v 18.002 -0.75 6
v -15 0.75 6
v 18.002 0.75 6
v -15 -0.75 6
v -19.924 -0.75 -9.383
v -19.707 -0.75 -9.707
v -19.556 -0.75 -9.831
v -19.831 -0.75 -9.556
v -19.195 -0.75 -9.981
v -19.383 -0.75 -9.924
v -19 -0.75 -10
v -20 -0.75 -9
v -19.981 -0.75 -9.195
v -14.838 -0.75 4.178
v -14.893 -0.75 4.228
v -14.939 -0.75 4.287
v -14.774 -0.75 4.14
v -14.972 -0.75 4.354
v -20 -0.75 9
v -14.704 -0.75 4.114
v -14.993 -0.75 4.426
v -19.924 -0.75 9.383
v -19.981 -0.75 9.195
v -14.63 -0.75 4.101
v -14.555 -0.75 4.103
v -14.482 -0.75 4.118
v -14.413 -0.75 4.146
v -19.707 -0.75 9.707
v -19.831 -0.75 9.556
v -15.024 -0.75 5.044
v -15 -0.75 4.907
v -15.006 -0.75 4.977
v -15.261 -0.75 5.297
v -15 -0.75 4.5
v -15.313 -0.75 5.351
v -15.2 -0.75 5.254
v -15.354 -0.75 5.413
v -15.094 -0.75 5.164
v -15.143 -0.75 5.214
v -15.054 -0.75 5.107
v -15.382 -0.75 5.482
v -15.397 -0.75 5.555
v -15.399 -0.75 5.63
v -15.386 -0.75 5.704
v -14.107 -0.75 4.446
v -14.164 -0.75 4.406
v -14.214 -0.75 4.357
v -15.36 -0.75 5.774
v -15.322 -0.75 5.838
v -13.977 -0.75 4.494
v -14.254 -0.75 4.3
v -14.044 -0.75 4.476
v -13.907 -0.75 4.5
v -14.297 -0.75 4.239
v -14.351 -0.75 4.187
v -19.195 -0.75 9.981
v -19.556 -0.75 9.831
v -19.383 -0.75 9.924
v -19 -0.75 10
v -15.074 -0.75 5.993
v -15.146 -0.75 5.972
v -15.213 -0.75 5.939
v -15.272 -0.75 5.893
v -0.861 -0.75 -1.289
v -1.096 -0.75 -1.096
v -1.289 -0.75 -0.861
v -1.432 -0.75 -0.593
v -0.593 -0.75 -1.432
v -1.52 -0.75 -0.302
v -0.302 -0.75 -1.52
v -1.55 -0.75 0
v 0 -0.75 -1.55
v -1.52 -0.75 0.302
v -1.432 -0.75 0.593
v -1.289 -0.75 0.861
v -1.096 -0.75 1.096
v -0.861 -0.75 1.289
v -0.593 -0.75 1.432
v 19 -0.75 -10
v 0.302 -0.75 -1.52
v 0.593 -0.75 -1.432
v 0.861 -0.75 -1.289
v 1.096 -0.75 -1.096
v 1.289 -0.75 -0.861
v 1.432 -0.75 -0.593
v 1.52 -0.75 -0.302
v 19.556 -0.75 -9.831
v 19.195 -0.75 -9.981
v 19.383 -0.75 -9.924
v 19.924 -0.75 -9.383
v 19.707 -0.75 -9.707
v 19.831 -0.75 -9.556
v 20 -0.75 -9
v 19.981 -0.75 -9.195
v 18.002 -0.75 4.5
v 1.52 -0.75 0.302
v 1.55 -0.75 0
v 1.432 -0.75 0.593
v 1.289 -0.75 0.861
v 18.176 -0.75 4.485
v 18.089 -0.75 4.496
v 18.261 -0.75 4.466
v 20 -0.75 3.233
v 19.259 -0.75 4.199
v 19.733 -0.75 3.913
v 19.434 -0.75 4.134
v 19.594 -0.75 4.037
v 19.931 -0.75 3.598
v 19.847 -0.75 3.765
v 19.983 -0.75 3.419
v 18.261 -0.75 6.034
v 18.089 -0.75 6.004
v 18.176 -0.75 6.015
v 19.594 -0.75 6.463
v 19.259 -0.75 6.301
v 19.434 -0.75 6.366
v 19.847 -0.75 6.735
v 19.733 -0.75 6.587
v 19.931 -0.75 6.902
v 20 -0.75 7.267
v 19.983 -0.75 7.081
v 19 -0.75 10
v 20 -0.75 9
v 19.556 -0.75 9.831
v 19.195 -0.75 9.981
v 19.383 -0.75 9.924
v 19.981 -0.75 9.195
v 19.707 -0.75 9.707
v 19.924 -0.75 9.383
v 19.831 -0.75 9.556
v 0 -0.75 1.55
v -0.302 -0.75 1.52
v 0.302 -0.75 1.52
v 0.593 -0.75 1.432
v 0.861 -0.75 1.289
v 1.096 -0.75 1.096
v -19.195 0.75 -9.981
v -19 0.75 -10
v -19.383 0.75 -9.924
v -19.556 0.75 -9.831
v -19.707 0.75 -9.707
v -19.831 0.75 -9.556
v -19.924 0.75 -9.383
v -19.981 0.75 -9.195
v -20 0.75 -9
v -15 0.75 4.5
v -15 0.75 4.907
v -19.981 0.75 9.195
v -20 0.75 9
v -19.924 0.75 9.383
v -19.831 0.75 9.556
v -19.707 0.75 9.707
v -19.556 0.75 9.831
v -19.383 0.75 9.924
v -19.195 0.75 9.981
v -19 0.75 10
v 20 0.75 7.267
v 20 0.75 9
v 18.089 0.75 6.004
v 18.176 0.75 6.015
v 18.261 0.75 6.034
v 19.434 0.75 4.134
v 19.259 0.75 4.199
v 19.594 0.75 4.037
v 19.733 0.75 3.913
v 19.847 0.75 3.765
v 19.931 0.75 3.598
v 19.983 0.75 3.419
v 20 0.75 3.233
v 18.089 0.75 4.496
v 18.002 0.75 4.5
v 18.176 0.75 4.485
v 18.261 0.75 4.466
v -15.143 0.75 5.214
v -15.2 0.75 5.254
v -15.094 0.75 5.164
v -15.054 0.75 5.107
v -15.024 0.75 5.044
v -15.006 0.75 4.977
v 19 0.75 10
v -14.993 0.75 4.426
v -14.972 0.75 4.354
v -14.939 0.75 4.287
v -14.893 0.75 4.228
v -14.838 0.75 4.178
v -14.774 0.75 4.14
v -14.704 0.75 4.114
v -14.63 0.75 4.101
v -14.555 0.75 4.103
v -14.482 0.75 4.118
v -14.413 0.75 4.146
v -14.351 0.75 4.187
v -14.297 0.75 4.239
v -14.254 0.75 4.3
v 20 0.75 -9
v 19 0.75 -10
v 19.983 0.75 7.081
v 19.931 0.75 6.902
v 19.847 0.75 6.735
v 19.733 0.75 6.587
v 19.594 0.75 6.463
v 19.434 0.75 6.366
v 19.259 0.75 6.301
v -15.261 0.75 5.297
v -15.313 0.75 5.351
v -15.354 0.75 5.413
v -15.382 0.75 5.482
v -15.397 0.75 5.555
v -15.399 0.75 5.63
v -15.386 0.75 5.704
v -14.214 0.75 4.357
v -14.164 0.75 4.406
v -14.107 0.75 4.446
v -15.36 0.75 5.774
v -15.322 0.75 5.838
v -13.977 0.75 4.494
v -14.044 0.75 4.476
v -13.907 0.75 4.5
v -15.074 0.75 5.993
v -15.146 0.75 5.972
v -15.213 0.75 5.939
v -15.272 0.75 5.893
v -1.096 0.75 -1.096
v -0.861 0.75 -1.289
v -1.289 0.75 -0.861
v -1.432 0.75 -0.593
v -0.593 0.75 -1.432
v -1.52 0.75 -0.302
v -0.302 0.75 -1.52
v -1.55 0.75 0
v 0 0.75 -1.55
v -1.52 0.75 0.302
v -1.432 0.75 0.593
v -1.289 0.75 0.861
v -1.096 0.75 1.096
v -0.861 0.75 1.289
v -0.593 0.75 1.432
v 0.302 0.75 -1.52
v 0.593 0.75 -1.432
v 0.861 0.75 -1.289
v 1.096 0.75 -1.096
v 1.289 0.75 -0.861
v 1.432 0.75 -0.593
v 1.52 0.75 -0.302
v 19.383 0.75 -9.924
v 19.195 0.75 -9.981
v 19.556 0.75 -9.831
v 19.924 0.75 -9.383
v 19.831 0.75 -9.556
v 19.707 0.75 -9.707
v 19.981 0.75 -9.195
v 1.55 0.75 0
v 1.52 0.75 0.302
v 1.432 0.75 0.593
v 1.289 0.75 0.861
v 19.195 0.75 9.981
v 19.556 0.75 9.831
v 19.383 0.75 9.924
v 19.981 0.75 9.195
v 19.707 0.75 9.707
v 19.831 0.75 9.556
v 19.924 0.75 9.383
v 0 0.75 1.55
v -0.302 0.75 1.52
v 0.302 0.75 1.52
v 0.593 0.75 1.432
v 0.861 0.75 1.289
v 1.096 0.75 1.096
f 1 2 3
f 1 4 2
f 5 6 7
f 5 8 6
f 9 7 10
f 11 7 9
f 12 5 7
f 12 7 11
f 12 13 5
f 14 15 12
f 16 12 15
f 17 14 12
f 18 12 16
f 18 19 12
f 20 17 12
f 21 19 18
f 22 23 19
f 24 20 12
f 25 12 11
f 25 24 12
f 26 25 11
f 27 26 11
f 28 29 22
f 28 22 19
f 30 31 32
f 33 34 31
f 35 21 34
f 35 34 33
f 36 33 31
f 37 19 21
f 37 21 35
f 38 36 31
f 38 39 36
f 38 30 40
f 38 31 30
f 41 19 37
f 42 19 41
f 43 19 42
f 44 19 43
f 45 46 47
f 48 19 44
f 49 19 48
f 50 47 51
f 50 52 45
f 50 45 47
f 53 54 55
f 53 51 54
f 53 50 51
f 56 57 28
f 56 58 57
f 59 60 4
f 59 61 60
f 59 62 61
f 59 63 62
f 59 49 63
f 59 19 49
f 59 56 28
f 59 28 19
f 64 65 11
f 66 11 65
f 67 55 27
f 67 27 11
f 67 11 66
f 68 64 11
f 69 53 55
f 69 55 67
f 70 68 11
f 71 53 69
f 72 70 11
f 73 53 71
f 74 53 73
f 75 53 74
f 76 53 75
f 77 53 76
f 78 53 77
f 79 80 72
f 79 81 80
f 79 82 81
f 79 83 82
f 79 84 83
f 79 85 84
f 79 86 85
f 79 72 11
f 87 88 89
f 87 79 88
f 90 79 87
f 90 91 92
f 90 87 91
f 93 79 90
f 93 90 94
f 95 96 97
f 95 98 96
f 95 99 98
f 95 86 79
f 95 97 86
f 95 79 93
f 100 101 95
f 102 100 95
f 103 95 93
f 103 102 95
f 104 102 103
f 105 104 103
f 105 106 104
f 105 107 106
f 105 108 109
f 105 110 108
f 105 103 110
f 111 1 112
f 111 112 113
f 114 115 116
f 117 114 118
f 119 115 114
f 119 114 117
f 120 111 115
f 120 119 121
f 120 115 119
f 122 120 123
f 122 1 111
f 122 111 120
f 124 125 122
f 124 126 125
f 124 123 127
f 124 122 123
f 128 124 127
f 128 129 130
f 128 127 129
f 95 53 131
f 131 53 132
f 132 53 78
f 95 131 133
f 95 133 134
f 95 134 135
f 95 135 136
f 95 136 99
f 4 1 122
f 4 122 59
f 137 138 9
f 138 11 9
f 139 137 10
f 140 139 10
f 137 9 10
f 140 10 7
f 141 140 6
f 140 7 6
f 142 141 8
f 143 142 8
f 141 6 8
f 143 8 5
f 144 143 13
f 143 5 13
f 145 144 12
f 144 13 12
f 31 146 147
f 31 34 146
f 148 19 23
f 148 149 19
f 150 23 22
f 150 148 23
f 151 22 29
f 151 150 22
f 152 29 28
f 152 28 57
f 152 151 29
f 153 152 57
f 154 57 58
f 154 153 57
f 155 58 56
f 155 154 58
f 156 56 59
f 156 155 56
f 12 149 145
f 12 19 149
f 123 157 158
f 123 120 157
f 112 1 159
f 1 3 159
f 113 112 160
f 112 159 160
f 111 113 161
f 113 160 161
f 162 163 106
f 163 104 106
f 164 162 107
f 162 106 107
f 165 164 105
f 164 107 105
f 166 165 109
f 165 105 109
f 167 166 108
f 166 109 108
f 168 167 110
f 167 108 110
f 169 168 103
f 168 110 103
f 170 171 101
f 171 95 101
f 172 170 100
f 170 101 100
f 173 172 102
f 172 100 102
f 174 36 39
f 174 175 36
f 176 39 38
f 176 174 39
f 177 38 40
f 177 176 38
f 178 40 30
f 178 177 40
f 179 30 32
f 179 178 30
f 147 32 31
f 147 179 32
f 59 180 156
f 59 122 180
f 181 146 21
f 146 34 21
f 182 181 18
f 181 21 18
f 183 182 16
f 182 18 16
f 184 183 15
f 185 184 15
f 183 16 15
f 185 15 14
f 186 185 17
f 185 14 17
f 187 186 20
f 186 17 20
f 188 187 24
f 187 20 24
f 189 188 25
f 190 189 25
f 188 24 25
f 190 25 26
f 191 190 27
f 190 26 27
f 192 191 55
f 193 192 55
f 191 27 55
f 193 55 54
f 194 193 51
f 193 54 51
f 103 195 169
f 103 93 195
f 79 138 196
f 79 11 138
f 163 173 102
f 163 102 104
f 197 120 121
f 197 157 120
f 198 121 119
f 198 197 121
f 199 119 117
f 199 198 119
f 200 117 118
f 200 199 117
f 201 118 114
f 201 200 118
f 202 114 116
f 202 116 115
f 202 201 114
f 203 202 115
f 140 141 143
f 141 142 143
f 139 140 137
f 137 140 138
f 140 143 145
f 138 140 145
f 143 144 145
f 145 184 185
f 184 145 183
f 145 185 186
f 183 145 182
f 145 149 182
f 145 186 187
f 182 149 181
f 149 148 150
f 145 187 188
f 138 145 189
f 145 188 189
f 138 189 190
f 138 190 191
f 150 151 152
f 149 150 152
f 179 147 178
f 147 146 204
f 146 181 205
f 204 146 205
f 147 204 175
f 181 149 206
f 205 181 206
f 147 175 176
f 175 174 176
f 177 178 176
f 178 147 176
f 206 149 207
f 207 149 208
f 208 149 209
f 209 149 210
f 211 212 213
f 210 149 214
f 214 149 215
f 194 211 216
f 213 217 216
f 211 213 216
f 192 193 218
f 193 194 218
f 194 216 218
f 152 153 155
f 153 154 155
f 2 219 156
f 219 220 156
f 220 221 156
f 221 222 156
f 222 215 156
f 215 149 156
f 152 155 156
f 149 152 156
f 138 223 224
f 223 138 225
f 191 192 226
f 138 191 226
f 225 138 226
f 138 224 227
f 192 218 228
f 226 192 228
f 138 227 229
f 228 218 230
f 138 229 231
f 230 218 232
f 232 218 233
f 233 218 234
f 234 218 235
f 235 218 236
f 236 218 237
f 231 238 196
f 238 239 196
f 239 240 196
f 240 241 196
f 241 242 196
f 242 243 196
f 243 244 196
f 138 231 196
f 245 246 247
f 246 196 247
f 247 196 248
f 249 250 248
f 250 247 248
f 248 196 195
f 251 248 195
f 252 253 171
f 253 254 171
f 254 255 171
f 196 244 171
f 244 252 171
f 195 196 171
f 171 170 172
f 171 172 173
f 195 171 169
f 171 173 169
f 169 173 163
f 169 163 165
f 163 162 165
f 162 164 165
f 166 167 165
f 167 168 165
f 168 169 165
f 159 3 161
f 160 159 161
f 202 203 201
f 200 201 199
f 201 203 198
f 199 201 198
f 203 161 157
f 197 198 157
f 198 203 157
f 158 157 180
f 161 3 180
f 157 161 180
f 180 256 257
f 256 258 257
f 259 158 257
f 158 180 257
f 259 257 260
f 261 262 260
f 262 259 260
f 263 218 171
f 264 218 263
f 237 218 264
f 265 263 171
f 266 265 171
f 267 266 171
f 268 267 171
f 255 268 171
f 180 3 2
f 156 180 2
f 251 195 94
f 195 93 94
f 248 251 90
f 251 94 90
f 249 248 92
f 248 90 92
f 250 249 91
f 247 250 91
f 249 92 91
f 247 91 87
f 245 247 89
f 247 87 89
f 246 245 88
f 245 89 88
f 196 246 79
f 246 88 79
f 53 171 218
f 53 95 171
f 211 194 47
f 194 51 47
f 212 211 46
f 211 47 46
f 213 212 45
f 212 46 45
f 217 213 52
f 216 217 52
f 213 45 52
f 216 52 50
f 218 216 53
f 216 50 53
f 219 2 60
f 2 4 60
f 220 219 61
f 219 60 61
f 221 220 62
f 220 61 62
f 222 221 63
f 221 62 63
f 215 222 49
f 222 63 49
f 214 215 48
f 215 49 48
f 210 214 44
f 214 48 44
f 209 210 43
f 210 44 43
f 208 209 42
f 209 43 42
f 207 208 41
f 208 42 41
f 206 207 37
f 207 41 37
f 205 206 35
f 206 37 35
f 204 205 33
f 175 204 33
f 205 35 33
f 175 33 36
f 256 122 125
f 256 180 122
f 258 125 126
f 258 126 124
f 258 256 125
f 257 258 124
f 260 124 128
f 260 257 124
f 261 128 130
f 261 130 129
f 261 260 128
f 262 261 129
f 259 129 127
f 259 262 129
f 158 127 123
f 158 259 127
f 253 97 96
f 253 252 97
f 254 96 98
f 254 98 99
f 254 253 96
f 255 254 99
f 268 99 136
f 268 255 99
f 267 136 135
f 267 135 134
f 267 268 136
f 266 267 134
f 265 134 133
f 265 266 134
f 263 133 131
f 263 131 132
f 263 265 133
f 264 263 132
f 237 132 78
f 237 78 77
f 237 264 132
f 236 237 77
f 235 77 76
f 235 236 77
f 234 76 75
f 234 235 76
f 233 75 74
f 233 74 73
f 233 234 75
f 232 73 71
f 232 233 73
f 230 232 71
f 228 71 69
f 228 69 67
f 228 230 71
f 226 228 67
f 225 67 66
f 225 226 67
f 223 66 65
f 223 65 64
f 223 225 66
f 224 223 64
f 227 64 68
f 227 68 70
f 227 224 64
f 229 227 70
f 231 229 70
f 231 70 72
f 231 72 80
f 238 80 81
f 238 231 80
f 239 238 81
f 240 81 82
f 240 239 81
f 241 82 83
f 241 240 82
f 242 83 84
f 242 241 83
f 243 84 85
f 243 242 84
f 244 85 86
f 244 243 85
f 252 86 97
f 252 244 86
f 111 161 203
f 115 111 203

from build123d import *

# Parameters (mm, degrees)
SKETCH004_R  = 1.55
PAD005_DEPTH = 0.75
FILLET006_R  = 0.4
FILLET007_R  = 1


with BuildPart() as part:
    # Sketch004 → Pad005 (new body, symmetric)
    with BuildSketch(Plane.XZ):
        with BuildLine():
            Line((-20, 10), (-20, -7))
            Line((-20, -8.5), (-20, -7))
            Line((-20, -8.5), (-20, -10))
            Line((-20, -10), (20, -10))
            Line((20, -10), (20, 4))
            Line((18.133975, 4.5), (20, 4))
            Line((18.133975, 4.5), (-14.2, 4.5))
            ThreePointArc((-15, 4.5), (-14.6, 4.1), (-14.2, 4.5))
            Line((-15, 4.5), (-15, 5.2))
            ThreePointArc((-15, 6), (-15.4, 5.6), (-15, 5.2))
            Line((-15, 6), (18.133975, 6))
            Line((18.133975, 6), (20, 6.5))
            Line((20, 6.5), (20, 10))
            Line((20, 10), (-20, 10))
        make_face()
        Circle(SKETCH004_R, mode=Mode.SUBTRACT)
    extrude(amount=PAD005_DEPTH, both=True)

    # Fillet006
    fillet006_edges = [part.edges().sort_by_distance(p)[0] for p in [
        (-15, 0, 5.2),
        (-14.2, 0, 4.5),
    ]]
    fillet(fillet006_edges, radius=FILLET006_R)

    # Fillet007
    fillet007_edges = [part.edges().sort_by_distance(p)[0] for p in [
        (18.133975, 0, 4.5),
        (18.133975, 0, 6),
        (20, 0, 6.5),
        (20, 0, 10),
        (20, 0, 4),
        (20, 0, -10),
        (-20, 0, -10),
        (-20, 0, 10),
    ]]
    fillet(fillet007_edges, radius=FILLET007_R)


solid = part.part
